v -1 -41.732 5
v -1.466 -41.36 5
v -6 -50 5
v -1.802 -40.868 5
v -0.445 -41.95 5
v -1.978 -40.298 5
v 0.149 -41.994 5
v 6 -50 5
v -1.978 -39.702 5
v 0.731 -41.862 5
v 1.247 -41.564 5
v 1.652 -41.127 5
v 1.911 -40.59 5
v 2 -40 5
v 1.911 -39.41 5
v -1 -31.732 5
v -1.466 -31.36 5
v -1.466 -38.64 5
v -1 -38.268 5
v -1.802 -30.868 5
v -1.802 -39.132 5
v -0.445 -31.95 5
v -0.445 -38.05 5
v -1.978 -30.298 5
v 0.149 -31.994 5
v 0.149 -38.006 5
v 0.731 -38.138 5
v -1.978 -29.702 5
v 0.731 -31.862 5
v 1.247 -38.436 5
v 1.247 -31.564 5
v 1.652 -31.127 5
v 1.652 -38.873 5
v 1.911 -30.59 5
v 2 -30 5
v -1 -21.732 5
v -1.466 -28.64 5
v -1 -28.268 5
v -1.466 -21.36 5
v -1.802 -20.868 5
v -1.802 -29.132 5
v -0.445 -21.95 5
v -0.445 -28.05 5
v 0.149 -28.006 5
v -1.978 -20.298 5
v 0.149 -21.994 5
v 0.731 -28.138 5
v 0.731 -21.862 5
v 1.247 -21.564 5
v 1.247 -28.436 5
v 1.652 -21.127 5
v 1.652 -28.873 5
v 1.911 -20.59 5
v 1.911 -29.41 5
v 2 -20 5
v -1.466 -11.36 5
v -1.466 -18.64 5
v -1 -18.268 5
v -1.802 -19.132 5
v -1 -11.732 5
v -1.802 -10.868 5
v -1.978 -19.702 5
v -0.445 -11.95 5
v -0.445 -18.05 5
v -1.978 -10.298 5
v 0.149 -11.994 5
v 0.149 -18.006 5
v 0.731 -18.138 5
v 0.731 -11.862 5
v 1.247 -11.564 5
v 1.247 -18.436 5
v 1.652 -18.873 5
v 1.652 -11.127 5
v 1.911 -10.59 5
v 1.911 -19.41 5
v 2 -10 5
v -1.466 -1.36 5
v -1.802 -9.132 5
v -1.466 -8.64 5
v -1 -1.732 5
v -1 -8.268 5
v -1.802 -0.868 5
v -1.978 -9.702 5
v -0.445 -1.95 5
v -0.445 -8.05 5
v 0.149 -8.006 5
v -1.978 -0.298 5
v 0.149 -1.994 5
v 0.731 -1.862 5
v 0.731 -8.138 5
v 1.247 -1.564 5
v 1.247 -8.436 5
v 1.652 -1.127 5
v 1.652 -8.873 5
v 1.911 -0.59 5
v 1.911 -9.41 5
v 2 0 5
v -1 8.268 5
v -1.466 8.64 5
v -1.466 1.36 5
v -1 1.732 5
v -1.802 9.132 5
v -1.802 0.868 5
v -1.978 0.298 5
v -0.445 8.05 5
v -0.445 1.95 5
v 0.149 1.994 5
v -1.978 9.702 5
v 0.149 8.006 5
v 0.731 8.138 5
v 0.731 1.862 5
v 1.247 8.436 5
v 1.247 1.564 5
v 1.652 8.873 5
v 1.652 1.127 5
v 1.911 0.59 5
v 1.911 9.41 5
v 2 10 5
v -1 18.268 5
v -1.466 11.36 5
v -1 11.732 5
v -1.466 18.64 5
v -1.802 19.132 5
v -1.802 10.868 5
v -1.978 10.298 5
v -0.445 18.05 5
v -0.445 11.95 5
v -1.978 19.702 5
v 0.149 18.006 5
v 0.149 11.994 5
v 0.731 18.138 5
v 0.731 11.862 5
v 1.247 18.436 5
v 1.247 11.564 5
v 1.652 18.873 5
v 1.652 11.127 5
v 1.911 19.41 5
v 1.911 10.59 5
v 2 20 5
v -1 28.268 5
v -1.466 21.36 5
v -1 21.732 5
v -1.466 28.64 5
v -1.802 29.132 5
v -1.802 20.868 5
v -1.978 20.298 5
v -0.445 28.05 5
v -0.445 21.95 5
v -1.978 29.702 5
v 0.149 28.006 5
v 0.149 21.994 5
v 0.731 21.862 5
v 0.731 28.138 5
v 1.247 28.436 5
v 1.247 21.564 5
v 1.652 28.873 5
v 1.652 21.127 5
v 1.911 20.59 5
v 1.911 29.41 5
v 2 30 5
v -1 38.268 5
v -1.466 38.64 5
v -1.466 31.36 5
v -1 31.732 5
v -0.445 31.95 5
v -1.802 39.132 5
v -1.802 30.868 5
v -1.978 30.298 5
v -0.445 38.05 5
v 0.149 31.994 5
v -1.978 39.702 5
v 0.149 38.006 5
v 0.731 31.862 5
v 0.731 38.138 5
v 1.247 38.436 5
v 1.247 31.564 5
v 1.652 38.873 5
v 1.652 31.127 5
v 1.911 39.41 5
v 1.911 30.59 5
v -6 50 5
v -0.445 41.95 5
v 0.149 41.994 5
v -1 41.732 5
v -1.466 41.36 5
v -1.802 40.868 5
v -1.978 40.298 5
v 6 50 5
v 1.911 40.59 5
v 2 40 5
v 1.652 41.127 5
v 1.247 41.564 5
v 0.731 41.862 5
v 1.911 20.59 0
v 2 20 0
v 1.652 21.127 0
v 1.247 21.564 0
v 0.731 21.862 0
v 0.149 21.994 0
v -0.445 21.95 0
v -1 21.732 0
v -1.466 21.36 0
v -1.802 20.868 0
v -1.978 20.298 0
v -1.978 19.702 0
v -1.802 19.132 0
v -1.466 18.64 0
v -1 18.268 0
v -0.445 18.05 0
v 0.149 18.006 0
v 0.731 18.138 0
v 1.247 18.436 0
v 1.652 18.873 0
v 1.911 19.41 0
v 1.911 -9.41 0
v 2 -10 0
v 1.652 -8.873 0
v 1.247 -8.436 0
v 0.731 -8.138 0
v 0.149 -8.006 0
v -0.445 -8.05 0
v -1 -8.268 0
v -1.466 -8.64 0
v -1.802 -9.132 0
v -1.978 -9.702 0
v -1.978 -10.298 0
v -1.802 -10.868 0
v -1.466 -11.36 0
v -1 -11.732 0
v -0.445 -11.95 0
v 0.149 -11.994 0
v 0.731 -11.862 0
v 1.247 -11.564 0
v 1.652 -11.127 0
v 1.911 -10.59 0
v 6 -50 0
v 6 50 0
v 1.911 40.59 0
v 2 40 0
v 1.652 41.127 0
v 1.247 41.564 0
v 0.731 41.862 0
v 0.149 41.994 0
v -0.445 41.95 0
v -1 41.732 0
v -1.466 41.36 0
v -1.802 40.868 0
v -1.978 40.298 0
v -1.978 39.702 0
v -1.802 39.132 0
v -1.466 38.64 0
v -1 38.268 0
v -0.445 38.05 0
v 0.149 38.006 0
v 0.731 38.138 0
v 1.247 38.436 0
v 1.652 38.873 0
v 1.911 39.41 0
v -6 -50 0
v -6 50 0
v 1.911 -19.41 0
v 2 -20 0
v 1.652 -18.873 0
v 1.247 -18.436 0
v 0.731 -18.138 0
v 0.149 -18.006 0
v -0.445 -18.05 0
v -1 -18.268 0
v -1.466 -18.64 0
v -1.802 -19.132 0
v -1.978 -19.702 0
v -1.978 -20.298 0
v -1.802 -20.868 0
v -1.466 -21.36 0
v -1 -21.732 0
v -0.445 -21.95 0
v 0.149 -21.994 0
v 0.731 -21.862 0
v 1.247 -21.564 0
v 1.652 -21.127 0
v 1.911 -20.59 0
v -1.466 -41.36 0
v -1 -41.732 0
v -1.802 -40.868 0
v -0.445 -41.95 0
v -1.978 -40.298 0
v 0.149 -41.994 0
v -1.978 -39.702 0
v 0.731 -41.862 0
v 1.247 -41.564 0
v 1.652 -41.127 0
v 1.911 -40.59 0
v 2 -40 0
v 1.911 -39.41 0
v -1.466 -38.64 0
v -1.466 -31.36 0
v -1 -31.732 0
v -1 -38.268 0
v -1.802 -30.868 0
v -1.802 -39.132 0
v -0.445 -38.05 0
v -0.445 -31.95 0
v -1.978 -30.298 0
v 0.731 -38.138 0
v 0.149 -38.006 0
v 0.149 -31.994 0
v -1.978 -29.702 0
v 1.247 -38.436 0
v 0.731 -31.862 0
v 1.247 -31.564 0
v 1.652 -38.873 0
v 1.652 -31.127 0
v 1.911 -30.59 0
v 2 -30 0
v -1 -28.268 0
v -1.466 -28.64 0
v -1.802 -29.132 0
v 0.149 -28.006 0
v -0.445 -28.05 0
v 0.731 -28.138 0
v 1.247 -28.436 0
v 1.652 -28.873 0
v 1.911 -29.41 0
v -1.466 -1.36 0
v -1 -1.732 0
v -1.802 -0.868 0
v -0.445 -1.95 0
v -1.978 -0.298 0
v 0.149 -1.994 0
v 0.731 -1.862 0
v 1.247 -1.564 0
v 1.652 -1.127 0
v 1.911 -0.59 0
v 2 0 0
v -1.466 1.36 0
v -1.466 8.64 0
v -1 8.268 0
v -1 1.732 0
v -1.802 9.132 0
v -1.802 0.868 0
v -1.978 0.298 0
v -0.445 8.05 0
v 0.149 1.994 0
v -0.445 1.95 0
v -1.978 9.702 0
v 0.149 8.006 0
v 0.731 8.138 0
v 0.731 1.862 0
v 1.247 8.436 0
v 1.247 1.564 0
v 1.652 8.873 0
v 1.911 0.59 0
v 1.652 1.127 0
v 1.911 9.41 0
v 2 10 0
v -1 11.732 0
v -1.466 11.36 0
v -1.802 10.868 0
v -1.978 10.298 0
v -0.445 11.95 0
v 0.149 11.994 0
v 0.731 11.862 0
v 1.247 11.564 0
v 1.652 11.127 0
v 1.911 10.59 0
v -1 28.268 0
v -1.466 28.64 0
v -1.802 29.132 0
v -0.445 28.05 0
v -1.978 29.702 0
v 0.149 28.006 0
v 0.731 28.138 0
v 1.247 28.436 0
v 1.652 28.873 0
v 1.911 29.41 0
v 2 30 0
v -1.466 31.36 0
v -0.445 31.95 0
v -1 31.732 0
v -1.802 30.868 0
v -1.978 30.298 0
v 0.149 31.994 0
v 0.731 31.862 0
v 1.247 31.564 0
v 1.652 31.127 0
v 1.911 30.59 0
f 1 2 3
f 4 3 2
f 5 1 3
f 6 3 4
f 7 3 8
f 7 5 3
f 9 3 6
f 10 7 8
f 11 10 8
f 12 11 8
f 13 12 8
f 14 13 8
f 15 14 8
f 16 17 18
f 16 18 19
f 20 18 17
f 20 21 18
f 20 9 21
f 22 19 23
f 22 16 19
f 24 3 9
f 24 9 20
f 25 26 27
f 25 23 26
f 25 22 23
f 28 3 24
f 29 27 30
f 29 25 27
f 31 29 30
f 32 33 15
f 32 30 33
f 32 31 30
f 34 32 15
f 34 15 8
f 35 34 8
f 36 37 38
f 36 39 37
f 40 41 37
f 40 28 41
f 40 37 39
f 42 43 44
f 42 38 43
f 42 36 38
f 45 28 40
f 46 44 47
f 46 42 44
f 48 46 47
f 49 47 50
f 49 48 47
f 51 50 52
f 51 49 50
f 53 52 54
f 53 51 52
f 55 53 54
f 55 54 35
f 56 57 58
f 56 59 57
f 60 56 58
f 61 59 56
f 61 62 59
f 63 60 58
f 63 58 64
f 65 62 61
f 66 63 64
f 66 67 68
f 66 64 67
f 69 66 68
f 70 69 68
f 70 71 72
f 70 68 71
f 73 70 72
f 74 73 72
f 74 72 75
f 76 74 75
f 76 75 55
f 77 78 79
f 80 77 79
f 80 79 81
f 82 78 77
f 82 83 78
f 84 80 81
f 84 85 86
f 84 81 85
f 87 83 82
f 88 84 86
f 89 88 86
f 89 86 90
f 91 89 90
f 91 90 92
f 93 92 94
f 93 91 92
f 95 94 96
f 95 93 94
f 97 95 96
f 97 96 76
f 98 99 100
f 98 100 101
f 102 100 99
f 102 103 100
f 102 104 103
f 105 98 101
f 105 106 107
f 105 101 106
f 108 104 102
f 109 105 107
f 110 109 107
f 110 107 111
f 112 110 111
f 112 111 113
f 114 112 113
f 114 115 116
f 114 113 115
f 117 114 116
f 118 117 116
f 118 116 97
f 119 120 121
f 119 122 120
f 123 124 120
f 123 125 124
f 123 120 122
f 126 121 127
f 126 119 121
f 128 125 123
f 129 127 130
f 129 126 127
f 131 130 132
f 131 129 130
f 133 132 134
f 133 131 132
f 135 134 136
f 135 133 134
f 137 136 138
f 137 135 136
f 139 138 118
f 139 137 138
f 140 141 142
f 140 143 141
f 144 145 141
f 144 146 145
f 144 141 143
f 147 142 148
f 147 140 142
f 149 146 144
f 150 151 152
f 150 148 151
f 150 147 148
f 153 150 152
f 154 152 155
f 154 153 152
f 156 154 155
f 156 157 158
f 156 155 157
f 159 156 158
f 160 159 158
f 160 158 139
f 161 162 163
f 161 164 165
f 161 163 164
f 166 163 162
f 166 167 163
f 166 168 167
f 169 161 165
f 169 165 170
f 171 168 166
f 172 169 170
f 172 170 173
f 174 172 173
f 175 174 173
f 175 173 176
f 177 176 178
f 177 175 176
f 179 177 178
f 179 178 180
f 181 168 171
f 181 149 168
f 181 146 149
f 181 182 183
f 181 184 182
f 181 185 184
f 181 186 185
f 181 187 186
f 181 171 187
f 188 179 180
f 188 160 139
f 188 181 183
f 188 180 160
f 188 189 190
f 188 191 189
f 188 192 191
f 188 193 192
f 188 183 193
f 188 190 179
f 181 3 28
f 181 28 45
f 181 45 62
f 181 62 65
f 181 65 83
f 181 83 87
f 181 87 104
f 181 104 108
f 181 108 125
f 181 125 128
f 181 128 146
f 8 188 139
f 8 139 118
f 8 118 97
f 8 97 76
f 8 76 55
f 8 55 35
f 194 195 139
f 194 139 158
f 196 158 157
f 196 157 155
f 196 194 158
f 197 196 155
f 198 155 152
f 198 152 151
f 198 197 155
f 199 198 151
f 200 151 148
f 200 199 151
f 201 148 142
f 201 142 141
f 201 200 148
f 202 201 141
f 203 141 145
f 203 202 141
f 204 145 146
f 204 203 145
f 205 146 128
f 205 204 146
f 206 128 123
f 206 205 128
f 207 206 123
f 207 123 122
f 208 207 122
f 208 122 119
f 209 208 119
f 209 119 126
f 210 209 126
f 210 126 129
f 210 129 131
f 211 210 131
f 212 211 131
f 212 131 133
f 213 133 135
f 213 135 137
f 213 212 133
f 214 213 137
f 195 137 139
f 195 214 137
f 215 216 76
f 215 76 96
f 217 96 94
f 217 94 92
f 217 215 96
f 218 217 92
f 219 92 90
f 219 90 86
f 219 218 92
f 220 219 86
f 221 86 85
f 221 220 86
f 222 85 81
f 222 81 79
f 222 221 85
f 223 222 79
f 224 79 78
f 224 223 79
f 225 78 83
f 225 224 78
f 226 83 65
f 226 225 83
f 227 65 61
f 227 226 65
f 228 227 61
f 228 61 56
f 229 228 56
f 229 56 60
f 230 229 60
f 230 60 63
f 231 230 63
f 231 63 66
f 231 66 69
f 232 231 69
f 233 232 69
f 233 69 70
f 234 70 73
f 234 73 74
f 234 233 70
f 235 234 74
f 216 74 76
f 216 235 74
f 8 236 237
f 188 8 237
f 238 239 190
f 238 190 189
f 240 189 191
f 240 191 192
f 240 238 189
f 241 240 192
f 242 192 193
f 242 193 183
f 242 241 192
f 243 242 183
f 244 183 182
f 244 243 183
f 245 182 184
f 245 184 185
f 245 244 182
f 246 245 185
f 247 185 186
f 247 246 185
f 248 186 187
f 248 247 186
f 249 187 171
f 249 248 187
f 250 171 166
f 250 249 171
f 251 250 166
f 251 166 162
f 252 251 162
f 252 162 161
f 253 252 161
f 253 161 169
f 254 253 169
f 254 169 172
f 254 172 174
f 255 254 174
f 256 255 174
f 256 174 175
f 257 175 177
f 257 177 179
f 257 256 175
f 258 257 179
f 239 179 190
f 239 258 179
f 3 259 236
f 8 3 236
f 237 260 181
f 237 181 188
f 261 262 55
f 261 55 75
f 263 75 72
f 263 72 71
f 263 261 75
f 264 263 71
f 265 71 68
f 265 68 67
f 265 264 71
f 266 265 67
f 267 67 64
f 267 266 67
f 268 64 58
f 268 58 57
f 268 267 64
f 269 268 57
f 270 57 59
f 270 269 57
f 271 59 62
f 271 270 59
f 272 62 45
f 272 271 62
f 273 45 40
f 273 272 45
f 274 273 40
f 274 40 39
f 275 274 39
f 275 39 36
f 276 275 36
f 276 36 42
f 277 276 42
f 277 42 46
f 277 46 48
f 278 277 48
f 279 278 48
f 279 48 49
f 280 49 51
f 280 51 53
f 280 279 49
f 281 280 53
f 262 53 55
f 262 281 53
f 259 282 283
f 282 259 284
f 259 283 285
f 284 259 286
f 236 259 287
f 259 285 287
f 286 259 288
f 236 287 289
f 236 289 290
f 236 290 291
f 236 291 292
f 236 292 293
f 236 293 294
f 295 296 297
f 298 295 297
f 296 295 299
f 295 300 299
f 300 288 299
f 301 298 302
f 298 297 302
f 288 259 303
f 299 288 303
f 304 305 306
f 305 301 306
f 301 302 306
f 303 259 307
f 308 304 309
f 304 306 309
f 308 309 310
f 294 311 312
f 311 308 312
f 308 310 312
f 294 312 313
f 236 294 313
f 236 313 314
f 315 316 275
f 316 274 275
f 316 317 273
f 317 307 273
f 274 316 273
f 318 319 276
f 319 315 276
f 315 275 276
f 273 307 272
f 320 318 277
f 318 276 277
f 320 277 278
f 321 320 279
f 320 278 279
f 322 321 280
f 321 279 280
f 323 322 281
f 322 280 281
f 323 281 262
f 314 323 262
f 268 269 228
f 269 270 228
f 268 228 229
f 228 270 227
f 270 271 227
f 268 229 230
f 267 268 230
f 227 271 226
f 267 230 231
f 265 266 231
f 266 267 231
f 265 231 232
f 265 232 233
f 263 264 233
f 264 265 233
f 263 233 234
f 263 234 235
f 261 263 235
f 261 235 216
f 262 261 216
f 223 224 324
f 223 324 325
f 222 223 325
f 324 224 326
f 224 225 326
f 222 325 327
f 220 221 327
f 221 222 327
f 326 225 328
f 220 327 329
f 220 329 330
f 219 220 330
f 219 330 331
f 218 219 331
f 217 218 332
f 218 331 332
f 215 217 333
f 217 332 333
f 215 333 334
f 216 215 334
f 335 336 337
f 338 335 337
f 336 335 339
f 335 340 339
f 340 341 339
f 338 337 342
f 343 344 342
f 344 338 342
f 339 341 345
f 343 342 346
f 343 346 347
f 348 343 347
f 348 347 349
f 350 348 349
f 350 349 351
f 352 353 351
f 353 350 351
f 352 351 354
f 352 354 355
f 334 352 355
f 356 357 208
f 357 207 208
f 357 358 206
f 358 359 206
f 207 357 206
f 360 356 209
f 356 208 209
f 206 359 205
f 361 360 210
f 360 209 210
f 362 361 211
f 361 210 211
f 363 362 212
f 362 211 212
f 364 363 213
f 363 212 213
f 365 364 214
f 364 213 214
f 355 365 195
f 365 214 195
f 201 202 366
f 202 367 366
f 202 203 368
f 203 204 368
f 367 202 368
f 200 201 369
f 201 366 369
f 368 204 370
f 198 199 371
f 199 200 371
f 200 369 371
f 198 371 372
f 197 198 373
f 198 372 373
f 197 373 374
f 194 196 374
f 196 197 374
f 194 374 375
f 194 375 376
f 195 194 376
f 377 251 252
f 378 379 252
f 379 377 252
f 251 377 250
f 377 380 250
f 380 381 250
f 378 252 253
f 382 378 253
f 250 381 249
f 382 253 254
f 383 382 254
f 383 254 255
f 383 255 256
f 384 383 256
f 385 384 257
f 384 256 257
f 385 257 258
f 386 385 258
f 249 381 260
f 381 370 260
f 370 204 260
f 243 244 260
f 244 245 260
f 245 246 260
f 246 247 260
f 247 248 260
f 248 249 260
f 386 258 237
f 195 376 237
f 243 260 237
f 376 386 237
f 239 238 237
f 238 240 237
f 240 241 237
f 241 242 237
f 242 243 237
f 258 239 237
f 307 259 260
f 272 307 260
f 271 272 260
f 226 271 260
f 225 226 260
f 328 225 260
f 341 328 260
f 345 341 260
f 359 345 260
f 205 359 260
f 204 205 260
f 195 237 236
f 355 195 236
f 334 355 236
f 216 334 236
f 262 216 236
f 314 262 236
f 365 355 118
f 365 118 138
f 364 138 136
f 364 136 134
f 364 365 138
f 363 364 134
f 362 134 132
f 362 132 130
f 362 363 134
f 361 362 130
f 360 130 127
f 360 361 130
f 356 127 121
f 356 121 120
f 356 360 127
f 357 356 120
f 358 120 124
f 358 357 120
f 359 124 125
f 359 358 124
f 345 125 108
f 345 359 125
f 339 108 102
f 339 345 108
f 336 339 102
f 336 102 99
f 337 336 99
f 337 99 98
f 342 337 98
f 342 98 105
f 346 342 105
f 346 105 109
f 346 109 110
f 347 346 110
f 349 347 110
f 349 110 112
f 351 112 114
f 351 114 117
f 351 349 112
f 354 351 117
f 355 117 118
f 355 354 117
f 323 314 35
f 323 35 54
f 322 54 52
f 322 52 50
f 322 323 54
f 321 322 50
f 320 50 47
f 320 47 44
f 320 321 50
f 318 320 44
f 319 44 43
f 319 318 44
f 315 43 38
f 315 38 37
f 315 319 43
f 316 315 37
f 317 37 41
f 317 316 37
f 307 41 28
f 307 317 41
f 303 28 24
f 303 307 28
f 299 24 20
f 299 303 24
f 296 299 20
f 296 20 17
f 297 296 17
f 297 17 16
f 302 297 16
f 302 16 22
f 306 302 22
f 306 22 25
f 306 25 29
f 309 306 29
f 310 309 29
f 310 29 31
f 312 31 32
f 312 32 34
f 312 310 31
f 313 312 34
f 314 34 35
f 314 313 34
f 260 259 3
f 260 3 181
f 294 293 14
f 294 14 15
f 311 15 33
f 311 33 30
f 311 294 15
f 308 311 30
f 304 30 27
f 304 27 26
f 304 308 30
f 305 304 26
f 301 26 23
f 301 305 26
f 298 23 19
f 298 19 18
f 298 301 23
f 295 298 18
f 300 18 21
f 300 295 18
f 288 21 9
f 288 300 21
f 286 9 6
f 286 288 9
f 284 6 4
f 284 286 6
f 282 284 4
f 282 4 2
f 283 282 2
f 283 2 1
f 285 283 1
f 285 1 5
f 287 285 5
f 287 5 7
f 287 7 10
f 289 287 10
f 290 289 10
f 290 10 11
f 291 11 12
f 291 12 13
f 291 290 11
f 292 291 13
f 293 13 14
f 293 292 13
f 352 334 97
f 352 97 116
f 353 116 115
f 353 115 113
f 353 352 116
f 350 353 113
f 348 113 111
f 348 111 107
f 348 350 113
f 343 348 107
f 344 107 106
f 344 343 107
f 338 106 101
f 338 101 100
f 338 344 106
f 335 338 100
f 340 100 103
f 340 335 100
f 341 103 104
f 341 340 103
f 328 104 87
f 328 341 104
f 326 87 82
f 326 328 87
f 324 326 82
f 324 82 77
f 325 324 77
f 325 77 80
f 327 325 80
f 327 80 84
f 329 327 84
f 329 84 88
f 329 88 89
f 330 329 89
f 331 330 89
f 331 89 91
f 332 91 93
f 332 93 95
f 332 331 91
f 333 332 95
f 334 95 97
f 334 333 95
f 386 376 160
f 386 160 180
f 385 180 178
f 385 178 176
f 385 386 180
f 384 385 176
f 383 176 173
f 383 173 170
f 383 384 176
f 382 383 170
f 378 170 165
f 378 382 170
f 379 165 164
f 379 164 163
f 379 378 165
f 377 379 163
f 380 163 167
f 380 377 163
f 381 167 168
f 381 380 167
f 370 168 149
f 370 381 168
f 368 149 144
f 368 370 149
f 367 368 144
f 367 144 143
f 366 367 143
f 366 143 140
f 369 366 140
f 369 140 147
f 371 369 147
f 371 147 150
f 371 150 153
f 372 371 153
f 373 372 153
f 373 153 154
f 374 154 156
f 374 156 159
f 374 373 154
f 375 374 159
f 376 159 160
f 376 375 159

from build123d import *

# Parameters (mm, degrees)
SKETCH1_W           = 12
SKETCH1_H           = 100
SKETCH1_R           = 2
BOSS_EXTRUDE1_DEPTH = 5


with BuildPart() as part:
    # Sketch1 → Boss-Extrude1 (new body)
    with BuildSketch(Plane.XY):
        Rectangle(SKETCH1_W, SKETCH1_H)
        Circle(SKETCH1_R, mode=Mode.SUBTRACT)
        with Locations((0, 10)):
            Circle(SKETCH1_R, mode=Mode.SUBTRACT)
        with Locations((0, 20)):
            Circle(SKETCH1_R, mode=Mode.SUBTRACT)
        with Locations((0, 30)):
            Circle(SKETCH1_R, mode=Mode.SUBTRACT)
        with Locations((0, 40)):
            Circle(SKETCH1_R, mode=Mode.SUBTRACT)
        with Locations((0, -10)):
            Circle(SKETCH1_R, mode=Mode.SUBTRACT)
        with Locations((0, -20)):
            Circle(SKETCH1_R, mode=Mode.SUBTRACT)
        with Locations((0, -30)):
            Circle(SKETCH1_R, mode=Mode.SUBTRACT)
        with Locations((0, -40)):
            Circle(SKETCH1_R, mode=Mode.SUBTRACT)
    extrude(amount=BOSS_EXTRUDE1_DEPTH)


solid = part.part
